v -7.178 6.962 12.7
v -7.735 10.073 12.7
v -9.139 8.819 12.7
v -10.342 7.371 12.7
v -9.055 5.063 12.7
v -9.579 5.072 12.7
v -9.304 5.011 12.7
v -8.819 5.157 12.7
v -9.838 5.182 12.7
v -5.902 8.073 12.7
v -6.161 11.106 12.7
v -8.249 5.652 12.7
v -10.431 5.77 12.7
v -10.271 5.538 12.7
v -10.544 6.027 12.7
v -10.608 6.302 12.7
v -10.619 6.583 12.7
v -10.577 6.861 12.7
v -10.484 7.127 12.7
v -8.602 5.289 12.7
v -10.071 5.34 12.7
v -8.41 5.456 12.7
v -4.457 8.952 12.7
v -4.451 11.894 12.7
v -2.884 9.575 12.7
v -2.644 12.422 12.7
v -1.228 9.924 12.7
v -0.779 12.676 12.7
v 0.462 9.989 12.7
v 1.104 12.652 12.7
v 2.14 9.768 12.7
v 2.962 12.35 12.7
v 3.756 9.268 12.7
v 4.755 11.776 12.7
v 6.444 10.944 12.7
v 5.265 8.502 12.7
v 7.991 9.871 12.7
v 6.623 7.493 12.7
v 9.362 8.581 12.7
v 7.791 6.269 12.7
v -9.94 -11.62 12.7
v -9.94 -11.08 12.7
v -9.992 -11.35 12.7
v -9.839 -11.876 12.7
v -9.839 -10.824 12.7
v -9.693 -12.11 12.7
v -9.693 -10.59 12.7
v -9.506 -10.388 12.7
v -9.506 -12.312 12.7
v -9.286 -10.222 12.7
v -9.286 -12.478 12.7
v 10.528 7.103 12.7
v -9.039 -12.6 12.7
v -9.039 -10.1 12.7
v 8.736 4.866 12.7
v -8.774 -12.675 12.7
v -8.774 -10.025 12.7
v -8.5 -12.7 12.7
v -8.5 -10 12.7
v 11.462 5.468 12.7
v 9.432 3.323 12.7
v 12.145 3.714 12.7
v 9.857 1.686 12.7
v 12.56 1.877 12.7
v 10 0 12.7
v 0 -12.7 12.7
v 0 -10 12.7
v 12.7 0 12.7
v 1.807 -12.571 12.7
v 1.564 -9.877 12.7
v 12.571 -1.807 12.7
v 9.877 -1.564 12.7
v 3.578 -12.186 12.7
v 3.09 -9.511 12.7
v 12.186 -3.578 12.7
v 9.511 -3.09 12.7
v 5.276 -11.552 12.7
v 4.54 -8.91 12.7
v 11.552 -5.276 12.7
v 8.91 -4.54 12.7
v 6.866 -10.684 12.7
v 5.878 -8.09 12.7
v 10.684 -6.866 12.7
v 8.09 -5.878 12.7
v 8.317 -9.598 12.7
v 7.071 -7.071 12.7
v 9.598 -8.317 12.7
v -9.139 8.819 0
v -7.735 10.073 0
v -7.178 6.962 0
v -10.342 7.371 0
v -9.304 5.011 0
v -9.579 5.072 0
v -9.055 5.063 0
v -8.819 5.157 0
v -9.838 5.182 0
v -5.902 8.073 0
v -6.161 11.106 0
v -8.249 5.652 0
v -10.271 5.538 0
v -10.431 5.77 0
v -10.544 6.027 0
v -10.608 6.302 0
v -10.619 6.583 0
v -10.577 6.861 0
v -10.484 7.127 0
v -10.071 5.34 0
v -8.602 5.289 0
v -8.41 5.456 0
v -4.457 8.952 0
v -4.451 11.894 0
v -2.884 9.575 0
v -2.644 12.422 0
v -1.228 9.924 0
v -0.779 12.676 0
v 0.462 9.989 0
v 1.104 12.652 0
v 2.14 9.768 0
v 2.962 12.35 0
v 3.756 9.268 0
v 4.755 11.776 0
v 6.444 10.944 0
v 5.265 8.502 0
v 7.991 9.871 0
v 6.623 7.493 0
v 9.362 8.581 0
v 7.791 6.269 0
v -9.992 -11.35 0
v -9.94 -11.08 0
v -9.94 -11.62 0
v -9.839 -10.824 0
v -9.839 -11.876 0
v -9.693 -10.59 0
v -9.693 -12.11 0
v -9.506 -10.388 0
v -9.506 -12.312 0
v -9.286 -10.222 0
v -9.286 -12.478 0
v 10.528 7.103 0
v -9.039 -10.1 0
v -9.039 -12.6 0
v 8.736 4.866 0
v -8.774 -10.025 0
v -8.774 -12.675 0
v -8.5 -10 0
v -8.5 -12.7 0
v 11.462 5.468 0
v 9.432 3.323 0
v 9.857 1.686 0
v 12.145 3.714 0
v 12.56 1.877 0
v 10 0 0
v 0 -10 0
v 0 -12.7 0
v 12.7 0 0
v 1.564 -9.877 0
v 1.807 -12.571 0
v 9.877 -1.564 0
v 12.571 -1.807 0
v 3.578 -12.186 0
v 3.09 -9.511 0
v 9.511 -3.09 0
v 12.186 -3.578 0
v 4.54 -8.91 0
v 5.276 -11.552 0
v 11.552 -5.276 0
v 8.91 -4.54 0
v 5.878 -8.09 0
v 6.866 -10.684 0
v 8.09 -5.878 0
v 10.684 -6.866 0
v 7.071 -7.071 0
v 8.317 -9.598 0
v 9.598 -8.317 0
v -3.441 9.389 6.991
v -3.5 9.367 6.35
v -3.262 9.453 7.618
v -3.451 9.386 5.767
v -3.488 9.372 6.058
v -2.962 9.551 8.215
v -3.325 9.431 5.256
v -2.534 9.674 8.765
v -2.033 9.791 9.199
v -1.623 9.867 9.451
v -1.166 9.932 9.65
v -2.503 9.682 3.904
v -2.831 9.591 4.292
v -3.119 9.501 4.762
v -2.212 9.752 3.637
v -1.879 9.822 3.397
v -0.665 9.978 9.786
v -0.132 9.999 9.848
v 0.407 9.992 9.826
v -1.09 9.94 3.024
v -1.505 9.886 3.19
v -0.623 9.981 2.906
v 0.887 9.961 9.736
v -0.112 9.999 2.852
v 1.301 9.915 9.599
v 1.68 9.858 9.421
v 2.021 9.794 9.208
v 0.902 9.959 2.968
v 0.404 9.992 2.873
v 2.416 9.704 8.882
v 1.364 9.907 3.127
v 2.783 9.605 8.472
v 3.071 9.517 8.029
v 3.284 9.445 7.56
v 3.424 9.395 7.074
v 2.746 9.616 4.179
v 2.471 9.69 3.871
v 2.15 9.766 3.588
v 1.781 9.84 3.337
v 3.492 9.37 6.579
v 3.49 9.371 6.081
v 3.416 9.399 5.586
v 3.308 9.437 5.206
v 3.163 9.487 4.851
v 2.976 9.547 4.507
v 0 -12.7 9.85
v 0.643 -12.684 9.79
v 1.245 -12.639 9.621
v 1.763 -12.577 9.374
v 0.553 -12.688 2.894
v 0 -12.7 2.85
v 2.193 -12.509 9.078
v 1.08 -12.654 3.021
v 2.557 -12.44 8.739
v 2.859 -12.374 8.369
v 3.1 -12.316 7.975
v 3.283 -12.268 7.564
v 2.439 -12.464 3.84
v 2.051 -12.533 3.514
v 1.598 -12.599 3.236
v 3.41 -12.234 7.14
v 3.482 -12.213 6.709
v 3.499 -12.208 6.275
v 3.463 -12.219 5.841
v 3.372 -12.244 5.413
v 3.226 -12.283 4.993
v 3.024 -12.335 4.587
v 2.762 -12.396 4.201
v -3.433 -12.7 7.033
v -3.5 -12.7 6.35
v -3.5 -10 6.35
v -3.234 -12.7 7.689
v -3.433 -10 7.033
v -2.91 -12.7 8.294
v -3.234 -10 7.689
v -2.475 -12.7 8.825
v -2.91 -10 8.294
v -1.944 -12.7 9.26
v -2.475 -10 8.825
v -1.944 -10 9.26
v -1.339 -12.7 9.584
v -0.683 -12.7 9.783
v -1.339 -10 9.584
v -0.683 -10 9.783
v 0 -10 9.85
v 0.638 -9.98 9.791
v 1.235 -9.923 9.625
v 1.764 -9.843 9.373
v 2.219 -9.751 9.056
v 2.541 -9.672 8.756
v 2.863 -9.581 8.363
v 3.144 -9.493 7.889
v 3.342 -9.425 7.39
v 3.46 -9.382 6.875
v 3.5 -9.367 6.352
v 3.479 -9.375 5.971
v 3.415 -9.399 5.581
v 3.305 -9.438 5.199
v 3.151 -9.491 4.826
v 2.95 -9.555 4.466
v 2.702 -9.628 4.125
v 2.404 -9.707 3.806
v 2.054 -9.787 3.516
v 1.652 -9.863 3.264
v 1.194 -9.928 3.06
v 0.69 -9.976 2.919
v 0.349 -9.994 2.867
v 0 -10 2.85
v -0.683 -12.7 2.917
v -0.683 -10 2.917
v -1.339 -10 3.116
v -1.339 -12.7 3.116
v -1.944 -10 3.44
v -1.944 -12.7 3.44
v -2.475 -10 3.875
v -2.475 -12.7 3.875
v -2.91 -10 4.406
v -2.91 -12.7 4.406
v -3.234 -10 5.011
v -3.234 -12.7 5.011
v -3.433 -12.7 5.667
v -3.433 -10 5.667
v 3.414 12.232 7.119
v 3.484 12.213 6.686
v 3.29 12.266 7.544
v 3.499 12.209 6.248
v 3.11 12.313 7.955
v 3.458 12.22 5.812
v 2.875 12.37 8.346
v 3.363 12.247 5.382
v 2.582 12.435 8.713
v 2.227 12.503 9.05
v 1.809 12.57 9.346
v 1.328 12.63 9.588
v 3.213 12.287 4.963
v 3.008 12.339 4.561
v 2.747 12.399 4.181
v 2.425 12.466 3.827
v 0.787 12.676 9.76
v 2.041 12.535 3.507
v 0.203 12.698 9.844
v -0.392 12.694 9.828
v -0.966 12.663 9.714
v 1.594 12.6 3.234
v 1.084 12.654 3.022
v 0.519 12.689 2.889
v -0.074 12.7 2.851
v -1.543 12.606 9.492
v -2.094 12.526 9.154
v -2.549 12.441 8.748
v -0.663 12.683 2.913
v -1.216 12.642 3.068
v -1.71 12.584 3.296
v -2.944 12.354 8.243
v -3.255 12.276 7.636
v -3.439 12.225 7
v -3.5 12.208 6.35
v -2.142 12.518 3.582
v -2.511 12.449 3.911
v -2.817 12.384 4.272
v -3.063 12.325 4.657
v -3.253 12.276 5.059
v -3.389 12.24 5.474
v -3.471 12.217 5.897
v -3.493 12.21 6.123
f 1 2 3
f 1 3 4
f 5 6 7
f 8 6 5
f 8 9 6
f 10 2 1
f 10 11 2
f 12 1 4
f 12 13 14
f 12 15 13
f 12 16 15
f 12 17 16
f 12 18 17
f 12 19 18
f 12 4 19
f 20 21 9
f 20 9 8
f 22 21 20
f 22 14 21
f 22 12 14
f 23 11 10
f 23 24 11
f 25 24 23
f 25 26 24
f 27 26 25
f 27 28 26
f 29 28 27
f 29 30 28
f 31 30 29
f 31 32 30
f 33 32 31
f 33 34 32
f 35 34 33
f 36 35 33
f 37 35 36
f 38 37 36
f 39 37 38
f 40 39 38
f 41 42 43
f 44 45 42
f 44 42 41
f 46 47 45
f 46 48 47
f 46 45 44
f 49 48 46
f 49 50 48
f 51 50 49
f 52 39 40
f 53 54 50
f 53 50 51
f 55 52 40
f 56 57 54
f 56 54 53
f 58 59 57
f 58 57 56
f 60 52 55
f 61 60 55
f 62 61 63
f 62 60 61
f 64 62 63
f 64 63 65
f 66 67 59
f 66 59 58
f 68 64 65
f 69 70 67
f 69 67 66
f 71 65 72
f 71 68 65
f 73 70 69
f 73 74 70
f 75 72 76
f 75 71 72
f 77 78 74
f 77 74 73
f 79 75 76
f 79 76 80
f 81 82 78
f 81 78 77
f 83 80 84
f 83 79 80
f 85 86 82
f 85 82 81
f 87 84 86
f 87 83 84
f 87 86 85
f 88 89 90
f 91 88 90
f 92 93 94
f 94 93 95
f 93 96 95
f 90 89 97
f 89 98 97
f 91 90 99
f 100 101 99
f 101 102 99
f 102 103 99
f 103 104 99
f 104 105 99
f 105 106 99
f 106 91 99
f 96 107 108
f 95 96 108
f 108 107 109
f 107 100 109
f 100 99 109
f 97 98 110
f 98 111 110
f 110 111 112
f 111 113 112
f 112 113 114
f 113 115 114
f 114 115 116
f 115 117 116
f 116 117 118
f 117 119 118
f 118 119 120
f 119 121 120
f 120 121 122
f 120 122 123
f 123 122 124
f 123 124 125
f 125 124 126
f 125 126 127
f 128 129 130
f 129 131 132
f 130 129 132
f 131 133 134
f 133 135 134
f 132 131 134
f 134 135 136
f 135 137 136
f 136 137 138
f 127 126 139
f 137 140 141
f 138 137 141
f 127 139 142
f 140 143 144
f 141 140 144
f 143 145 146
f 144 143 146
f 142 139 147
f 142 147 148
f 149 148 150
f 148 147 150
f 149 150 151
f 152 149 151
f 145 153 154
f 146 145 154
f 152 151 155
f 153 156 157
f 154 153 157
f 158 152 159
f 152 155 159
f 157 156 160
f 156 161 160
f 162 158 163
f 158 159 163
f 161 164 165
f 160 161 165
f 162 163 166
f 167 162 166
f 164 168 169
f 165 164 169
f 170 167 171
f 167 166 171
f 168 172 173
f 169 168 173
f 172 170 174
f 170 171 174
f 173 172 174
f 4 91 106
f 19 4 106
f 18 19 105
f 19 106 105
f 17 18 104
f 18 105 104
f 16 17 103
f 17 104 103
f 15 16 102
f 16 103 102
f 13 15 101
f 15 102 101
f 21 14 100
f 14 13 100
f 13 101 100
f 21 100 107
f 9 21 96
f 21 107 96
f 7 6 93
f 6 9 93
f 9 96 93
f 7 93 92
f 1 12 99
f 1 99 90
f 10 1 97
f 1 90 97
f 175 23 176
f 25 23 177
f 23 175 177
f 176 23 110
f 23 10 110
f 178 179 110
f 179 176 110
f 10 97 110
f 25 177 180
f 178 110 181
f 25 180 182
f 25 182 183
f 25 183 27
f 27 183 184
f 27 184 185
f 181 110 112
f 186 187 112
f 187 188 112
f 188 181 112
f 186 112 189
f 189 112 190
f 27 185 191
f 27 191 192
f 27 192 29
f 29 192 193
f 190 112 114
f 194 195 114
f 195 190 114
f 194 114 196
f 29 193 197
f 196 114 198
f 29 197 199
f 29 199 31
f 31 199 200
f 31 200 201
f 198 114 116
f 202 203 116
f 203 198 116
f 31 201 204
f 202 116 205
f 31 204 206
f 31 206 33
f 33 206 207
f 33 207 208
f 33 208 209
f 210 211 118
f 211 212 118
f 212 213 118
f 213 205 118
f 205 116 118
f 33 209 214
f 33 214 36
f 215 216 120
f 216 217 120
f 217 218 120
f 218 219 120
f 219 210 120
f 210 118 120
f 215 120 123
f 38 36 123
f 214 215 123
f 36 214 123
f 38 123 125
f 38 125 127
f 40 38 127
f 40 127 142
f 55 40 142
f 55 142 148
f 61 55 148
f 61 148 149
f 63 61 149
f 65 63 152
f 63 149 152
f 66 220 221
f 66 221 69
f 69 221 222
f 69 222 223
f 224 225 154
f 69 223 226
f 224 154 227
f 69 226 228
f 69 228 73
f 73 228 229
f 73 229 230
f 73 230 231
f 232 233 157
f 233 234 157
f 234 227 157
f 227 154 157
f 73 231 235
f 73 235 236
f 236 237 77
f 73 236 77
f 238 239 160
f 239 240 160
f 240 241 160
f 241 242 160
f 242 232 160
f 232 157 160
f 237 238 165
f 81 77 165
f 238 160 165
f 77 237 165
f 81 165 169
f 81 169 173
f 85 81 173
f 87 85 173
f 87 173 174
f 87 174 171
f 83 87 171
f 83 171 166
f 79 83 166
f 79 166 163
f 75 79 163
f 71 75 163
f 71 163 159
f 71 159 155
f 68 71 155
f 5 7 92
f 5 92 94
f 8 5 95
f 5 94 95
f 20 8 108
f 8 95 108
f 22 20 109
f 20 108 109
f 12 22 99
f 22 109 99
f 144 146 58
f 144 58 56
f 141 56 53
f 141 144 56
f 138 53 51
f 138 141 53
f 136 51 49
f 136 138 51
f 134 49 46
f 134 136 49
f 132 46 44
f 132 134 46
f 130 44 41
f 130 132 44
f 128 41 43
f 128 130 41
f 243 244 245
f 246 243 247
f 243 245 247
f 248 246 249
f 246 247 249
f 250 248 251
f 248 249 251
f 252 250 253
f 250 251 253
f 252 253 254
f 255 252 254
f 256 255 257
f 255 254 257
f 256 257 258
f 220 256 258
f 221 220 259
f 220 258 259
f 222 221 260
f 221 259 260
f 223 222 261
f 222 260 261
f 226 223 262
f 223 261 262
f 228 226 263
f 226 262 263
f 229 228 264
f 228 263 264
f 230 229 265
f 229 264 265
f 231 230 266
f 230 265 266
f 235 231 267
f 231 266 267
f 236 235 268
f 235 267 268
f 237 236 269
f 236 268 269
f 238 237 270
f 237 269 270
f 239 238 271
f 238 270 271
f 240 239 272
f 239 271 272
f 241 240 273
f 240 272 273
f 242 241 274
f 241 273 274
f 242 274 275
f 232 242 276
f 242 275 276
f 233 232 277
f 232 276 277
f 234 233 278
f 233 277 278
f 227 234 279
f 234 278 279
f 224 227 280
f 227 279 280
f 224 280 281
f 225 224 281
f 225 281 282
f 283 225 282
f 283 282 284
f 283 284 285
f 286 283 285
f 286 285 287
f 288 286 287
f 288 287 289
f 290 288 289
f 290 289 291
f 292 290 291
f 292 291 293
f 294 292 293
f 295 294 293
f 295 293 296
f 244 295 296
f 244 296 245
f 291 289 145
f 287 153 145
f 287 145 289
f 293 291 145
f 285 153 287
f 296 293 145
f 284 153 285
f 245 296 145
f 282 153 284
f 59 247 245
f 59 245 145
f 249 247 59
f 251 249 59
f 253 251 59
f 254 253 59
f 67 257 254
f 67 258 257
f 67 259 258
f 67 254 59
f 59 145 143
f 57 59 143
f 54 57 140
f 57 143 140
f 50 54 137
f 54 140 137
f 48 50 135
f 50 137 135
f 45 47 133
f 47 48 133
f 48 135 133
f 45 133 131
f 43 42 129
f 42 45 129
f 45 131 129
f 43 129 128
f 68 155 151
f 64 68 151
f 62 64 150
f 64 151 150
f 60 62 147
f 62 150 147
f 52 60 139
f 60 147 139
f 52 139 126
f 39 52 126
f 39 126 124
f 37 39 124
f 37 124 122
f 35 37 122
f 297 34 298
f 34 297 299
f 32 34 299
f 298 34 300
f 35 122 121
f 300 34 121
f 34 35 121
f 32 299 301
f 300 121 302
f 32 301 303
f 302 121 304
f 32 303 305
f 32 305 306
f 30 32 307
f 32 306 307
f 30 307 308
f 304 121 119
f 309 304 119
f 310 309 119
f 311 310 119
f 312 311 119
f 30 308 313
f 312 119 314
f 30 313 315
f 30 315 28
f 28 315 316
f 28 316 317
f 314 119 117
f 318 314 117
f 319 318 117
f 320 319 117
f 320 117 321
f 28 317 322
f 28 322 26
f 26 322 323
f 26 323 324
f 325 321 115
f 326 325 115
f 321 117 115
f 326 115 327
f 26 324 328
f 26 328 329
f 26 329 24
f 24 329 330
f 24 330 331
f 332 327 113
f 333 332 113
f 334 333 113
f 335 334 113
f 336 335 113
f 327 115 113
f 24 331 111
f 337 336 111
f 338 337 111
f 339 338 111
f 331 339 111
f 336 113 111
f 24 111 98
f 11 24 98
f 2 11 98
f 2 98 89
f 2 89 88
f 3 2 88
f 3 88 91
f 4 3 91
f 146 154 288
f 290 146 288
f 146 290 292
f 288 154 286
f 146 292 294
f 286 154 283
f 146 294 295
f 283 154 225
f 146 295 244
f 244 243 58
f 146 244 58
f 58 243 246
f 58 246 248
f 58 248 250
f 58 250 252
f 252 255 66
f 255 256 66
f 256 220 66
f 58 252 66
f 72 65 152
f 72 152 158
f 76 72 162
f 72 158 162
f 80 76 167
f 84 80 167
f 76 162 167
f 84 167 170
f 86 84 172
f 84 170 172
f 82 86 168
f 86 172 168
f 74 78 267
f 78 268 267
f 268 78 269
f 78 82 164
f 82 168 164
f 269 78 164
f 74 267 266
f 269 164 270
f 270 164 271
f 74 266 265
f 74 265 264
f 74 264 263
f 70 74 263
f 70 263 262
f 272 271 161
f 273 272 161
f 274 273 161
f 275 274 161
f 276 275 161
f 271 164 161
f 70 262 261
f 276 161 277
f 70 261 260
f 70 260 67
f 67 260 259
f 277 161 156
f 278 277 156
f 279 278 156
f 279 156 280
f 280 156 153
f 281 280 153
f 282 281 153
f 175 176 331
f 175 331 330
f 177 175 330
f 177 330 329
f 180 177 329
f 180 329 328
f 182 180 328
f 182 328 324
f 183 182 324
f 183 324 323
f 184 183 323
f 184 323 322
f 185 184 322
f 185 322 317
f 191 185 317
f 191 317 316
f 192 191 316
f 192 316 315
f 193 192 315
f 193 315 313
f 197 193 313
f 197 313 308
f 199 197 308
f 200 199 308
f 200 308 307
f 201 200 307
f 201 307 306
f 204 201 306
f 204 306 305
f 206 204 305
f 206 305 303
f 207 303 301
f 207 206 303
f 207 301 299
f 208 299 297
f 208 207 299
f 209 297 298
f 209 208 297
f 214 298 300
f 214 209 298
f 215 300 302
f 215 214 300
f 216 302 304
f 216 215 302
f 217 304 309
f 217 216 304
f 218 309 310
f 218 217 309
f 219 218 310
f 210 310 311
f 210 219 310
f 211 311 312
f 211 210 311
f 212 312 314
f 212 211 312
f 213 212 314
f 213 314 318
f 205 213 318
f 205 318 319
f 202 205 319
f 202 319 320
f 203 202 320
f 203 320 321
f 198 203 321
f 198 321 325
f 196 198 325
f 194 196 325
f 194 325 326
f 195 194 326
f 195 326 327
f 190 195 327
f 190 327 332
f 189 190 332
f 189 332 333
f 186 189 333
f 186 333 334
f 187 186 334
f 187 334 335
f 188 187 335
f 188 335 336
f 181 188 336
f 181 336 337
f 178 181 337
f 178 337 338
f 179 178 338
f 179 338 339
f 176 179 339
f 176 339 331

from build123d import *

# Parameters (mm, degrees)
F1_DEPTH      = 12.7
F2_W          = 2.7
F2_H          = 12.7
F3_DEPTH      = 10
F4_R          = 3.5
F5_DEPTH      = 2.701
F5_DEPTH_BACK = 22.701
F6_T1_DEPTH   = 20.2
F7_W          = 8.7146805599
F7_H          = 16.2741800305
F8_DEPTH      = 5
F9_T1_DEPTH   = 16.8328947133
F9_T3_DEPTH   = 26.2954806011


# Not quite as in the source:
# - a fillet or chamfer that OpenCascade refuses, or shapes differently, is made with other operations: its cross-section is extruded or revolved along the edge and cut away or added


with BuildPart() as f1:
    # F0 (on Top) → F1 (new body)
    with BuildSketch(Plane.XY):
        with BuildLine():
            ThreePointArc((0, -12.7), (8.9802561211, -8.9802561211), (12.7, 0))
            ThreePointArc((12.7, 0), (0, 12.7), (-12.7, 0))
            Line((-12.7, 0), (-10, 0))
            ThreePointArc((-10, 0), (0, 10), (10, 0))
            ThreePointArc((10, 0), (7.0710678119, -7.0710678119), (0, -10))
            Line((0, -10), (0, -12.7))
        make_face()
    extrude(amount=F1_DEPTH)

    # F2 (on face) → F3 (join)
    with BuildSketch(Plane(origin=(0, 0, 0), x_dir=(0, -1, 0), z_dir=(-1, 0, 0))):
        with Locations((11.35, 6.35)):
            Rectangle(F2_W, F2_H)
    extrude(amount=F3_DEPTH)

    # F4 (on face) → F5 (cut, two sides)
    with BuildSketch(Plane(origin=(0, -10, 0), x_dir=(-1, 0, 0), z_dir=(0, 1, 0))) as f5_sk:
        with Locations((0, 6.35)):
            Circle(F4_R)
    extrude(amount=-F5_DEPTH, mode=Mode.SUBTRACT)
    extrude(f5_sk.sketch, amount=F5_DEPTH_BACK, mode=Mode.SUBTRACT)

    # F6: fillet of radius 1.5 on 2 edges, made by hand

    # F6_s2 → F6_t1 (cut)
    with BuildSketch(Plane.XY.offset(-3.75)):
        with BuildLine():
            ThreePointArc((-8.5, -10), (-9.5606601718, -10.4393398282), (-10, -11.5))
            Line((-10, -11.5), (-10, -10))
            Line((-10, -10), (-8.5, -10))
        make_face()
        with BuildLine():
            ThreePointArc((-8.5, -12.7), (-9.5606601718, -12.2606601718), (-10, -11.2))
            Line((-10, -11.2), (-10, -12.7))
            Line((-10, -12.7), (-8.5, -12.7))
        make_face()
    extrude(amount=F6_T1_DEPTH, mode=Mode.SUBTRACT)

    # F7 (on face) → F8 (cut)
    with BuildSketch(Plane.XZ):
        with Locations((-12.651483994, 6.0685008066)):
            Rectangle(F7_W, F7_H)
    extrude(amount=-F8_DEPTH, mode=Mode.SUBTRACT)

    # F9: fillet of radius 1.5 on 2 edges, made by hand

    # F9_s2 → F9_t1 (cut)
    with BuildSketch(Plane.XY.offset(-2.0664473567)):
        with BuildLine():
            ThreePointArc((-9.4868329805, 5), (-8.7874543743, 5.1730223946), (-8.249419983, 5.652173913))
            ThreePointArc((-8.249419983, 5.652173913), (-8.4611229501, 5.3300467562), (-8.6602540378, 5))
            Line((-8.6602540378, 5), (-9.4868329805, 5))
        make_face()
    extrude(amount=F9_T1_DEPTH, mode=Mode.SUBTRACT)

    # F9_s4 → F9_t3 (cut)
    with BuildSketch(Plane.XY.offset(-6.7977403006)):
        with BuildLine():
            ThreePointArc((-10.3423983333, 7.3705357143), (-10.4542350586, 5.812905964), (-9.1208552231, 5))
            Line((-9.1208552231, 5), (-11.6743308159, 5))
            ThreePointArc((-11.6743308159, 5), (-11.0719894554, 6.2210167577), (-10.3423983333, 7.3705357143))
        make_face()
    extrude(amount=F9_T3_DEPTH, mode=Mode.SUBTRACT)


solid = f1.part
